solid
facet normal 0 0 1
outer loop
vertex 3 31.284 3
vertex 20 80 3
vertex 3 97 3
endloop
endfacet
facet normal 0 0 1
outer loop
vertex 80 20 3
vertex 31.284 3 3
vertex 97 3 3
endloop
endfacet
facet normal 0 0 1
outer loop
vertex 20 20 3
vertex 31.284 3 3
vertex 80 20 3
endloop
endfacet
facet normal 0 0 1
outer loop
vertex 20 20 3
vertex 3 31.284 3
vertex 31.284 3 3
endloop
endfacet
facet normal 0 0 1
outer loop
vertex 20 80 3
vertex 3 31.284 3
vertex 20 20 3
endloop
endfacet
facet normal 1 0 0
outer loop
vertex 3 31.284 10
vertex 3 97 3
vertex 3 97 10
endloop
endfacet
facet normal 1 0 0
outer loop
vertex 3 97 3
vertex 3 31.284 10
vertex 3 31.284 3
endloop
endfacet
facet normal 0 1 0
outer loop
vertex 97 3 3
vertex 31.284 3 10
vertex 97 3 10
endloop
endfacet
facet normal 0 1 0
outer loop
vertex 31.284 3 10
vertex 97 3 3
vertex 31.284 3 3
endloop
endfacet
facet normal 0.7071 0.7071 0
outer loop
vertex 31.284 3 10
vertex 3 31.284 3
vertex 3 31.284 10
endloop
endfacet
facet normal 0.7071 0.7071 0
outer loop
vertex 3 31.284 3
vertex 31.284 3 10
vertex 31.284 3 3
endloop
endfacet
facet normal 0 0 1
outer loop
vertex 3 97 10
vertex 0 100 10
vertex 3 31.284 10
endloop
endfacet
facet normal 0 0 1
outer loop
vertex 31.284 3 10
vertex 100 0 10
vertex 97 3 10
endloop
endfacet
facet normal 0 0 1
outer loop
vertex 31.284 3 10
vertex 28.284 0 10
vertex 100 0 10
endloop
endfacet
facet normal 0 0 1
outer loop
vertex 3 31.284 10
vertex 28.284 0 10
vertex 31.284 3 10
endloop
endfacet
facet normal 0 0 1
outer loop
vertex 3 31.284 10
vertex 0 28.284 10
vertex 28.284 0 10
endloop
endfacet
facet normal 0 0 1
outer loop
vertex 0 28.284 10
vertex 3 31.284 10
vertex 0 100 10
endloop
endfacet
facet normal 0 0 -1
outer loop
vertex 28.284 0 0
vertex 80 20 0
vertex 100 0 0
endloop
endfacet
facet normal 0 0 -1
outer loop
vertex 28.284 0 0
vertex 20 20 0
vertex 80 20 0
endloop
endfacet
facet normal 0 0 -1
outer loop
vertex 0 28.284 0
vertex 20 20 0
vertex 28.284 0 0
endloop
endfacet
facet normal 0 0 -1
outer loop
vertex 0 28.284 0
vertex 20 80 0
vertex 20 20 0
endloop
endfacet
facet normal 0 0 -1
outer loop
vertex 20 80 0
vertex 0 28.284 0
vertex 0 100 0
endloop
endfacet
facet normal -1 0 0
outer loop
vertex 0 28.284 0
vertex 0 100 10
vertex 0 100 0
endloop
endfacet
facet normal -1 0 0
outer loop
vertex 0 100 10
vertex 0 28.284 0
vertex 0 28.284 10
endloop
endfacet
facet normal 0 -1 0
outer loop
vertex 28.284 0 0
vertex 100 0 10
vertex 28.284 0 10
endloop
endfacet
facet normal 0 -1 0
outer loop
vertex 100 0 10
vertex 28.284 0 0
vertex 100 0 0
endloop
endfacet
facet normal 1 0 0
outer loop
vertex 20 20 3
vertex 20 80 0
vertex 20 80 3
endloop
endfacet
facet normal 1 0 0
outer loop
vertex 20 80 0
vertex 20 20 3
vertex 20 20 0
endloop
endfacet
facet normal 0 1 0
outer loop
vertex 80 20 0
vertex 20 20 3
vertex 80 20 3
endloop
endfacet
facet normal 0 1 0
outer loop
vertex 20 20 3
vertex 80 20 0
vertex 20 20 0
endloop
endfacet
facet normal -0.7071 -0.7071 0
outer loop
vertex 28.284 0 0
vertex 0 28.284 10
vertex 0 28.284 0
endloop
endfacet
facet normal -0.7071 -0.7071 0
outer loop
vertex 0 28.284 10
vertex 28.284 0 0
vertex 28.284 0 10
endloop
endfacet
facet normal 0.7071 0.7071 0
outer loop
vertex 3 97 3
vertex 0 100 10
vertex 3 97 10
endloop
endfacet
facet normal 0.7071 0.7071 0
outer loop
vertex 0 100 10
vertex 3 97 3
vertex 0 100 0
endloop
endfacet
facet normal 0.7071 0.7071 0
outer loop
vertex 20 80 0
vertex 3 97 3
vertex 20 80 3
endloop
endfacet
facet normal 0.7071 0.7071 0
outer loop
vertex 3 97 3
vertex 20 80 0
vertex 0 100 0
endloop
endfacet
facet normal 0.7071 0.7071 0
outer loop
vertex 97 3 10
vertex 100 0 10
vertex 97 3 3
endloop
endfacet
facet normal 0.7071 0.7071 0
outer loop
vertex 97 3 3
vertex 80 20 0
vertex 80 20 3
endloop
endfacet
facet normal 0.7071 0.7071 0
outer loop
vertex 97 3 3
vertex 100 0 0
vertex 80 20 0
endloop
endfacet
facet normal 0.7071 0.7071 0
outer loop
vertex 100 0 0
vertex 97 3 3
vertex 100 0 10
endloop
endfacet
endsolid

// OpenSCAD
length = 100;
height = 100;
depth = 10;
frame_width = 20;
shelf_thickness = 3;
perimeter_thickness = 3;

difference(){
    // bounding box
    cube([length, height, depth]);
    
    // main cut-out
    translate([frame_width, frame_width, -1]){
        cube([length, height, depth + 2]);
    }
    
    // this prevents shelf cut from penetrating the perimeter
    difference(){
        
        // shelf cut-out
        translate([perimeter_thickness, perimeter_thickness,        shelf_thickness]){
            cube([length, height, depth + 2]);
        }    
        
        // outer slash cut
        translate([perimeter_thickness, perimeter_thickness,0]){
            rotate([0,0,-45]){
                translate([-length,0,-1]){
                    cube([length *2, frame_width, depth +2]);
                }
            }     
        } 
    }
    
    // outer slash cut
    rotate([0,0,-45]){
        translate([-length,0,-1]){
            cube([length *2, frame_width, depth +2]);
        }
    }
    
    // inner slash cut
    translate([length/2, height/2, 0]){
        rotate([0,0,-45]){
            translate([-length,0,-1]){
                cube([length *2, frame_width, depth +2]);
            }
        }
    }

}
